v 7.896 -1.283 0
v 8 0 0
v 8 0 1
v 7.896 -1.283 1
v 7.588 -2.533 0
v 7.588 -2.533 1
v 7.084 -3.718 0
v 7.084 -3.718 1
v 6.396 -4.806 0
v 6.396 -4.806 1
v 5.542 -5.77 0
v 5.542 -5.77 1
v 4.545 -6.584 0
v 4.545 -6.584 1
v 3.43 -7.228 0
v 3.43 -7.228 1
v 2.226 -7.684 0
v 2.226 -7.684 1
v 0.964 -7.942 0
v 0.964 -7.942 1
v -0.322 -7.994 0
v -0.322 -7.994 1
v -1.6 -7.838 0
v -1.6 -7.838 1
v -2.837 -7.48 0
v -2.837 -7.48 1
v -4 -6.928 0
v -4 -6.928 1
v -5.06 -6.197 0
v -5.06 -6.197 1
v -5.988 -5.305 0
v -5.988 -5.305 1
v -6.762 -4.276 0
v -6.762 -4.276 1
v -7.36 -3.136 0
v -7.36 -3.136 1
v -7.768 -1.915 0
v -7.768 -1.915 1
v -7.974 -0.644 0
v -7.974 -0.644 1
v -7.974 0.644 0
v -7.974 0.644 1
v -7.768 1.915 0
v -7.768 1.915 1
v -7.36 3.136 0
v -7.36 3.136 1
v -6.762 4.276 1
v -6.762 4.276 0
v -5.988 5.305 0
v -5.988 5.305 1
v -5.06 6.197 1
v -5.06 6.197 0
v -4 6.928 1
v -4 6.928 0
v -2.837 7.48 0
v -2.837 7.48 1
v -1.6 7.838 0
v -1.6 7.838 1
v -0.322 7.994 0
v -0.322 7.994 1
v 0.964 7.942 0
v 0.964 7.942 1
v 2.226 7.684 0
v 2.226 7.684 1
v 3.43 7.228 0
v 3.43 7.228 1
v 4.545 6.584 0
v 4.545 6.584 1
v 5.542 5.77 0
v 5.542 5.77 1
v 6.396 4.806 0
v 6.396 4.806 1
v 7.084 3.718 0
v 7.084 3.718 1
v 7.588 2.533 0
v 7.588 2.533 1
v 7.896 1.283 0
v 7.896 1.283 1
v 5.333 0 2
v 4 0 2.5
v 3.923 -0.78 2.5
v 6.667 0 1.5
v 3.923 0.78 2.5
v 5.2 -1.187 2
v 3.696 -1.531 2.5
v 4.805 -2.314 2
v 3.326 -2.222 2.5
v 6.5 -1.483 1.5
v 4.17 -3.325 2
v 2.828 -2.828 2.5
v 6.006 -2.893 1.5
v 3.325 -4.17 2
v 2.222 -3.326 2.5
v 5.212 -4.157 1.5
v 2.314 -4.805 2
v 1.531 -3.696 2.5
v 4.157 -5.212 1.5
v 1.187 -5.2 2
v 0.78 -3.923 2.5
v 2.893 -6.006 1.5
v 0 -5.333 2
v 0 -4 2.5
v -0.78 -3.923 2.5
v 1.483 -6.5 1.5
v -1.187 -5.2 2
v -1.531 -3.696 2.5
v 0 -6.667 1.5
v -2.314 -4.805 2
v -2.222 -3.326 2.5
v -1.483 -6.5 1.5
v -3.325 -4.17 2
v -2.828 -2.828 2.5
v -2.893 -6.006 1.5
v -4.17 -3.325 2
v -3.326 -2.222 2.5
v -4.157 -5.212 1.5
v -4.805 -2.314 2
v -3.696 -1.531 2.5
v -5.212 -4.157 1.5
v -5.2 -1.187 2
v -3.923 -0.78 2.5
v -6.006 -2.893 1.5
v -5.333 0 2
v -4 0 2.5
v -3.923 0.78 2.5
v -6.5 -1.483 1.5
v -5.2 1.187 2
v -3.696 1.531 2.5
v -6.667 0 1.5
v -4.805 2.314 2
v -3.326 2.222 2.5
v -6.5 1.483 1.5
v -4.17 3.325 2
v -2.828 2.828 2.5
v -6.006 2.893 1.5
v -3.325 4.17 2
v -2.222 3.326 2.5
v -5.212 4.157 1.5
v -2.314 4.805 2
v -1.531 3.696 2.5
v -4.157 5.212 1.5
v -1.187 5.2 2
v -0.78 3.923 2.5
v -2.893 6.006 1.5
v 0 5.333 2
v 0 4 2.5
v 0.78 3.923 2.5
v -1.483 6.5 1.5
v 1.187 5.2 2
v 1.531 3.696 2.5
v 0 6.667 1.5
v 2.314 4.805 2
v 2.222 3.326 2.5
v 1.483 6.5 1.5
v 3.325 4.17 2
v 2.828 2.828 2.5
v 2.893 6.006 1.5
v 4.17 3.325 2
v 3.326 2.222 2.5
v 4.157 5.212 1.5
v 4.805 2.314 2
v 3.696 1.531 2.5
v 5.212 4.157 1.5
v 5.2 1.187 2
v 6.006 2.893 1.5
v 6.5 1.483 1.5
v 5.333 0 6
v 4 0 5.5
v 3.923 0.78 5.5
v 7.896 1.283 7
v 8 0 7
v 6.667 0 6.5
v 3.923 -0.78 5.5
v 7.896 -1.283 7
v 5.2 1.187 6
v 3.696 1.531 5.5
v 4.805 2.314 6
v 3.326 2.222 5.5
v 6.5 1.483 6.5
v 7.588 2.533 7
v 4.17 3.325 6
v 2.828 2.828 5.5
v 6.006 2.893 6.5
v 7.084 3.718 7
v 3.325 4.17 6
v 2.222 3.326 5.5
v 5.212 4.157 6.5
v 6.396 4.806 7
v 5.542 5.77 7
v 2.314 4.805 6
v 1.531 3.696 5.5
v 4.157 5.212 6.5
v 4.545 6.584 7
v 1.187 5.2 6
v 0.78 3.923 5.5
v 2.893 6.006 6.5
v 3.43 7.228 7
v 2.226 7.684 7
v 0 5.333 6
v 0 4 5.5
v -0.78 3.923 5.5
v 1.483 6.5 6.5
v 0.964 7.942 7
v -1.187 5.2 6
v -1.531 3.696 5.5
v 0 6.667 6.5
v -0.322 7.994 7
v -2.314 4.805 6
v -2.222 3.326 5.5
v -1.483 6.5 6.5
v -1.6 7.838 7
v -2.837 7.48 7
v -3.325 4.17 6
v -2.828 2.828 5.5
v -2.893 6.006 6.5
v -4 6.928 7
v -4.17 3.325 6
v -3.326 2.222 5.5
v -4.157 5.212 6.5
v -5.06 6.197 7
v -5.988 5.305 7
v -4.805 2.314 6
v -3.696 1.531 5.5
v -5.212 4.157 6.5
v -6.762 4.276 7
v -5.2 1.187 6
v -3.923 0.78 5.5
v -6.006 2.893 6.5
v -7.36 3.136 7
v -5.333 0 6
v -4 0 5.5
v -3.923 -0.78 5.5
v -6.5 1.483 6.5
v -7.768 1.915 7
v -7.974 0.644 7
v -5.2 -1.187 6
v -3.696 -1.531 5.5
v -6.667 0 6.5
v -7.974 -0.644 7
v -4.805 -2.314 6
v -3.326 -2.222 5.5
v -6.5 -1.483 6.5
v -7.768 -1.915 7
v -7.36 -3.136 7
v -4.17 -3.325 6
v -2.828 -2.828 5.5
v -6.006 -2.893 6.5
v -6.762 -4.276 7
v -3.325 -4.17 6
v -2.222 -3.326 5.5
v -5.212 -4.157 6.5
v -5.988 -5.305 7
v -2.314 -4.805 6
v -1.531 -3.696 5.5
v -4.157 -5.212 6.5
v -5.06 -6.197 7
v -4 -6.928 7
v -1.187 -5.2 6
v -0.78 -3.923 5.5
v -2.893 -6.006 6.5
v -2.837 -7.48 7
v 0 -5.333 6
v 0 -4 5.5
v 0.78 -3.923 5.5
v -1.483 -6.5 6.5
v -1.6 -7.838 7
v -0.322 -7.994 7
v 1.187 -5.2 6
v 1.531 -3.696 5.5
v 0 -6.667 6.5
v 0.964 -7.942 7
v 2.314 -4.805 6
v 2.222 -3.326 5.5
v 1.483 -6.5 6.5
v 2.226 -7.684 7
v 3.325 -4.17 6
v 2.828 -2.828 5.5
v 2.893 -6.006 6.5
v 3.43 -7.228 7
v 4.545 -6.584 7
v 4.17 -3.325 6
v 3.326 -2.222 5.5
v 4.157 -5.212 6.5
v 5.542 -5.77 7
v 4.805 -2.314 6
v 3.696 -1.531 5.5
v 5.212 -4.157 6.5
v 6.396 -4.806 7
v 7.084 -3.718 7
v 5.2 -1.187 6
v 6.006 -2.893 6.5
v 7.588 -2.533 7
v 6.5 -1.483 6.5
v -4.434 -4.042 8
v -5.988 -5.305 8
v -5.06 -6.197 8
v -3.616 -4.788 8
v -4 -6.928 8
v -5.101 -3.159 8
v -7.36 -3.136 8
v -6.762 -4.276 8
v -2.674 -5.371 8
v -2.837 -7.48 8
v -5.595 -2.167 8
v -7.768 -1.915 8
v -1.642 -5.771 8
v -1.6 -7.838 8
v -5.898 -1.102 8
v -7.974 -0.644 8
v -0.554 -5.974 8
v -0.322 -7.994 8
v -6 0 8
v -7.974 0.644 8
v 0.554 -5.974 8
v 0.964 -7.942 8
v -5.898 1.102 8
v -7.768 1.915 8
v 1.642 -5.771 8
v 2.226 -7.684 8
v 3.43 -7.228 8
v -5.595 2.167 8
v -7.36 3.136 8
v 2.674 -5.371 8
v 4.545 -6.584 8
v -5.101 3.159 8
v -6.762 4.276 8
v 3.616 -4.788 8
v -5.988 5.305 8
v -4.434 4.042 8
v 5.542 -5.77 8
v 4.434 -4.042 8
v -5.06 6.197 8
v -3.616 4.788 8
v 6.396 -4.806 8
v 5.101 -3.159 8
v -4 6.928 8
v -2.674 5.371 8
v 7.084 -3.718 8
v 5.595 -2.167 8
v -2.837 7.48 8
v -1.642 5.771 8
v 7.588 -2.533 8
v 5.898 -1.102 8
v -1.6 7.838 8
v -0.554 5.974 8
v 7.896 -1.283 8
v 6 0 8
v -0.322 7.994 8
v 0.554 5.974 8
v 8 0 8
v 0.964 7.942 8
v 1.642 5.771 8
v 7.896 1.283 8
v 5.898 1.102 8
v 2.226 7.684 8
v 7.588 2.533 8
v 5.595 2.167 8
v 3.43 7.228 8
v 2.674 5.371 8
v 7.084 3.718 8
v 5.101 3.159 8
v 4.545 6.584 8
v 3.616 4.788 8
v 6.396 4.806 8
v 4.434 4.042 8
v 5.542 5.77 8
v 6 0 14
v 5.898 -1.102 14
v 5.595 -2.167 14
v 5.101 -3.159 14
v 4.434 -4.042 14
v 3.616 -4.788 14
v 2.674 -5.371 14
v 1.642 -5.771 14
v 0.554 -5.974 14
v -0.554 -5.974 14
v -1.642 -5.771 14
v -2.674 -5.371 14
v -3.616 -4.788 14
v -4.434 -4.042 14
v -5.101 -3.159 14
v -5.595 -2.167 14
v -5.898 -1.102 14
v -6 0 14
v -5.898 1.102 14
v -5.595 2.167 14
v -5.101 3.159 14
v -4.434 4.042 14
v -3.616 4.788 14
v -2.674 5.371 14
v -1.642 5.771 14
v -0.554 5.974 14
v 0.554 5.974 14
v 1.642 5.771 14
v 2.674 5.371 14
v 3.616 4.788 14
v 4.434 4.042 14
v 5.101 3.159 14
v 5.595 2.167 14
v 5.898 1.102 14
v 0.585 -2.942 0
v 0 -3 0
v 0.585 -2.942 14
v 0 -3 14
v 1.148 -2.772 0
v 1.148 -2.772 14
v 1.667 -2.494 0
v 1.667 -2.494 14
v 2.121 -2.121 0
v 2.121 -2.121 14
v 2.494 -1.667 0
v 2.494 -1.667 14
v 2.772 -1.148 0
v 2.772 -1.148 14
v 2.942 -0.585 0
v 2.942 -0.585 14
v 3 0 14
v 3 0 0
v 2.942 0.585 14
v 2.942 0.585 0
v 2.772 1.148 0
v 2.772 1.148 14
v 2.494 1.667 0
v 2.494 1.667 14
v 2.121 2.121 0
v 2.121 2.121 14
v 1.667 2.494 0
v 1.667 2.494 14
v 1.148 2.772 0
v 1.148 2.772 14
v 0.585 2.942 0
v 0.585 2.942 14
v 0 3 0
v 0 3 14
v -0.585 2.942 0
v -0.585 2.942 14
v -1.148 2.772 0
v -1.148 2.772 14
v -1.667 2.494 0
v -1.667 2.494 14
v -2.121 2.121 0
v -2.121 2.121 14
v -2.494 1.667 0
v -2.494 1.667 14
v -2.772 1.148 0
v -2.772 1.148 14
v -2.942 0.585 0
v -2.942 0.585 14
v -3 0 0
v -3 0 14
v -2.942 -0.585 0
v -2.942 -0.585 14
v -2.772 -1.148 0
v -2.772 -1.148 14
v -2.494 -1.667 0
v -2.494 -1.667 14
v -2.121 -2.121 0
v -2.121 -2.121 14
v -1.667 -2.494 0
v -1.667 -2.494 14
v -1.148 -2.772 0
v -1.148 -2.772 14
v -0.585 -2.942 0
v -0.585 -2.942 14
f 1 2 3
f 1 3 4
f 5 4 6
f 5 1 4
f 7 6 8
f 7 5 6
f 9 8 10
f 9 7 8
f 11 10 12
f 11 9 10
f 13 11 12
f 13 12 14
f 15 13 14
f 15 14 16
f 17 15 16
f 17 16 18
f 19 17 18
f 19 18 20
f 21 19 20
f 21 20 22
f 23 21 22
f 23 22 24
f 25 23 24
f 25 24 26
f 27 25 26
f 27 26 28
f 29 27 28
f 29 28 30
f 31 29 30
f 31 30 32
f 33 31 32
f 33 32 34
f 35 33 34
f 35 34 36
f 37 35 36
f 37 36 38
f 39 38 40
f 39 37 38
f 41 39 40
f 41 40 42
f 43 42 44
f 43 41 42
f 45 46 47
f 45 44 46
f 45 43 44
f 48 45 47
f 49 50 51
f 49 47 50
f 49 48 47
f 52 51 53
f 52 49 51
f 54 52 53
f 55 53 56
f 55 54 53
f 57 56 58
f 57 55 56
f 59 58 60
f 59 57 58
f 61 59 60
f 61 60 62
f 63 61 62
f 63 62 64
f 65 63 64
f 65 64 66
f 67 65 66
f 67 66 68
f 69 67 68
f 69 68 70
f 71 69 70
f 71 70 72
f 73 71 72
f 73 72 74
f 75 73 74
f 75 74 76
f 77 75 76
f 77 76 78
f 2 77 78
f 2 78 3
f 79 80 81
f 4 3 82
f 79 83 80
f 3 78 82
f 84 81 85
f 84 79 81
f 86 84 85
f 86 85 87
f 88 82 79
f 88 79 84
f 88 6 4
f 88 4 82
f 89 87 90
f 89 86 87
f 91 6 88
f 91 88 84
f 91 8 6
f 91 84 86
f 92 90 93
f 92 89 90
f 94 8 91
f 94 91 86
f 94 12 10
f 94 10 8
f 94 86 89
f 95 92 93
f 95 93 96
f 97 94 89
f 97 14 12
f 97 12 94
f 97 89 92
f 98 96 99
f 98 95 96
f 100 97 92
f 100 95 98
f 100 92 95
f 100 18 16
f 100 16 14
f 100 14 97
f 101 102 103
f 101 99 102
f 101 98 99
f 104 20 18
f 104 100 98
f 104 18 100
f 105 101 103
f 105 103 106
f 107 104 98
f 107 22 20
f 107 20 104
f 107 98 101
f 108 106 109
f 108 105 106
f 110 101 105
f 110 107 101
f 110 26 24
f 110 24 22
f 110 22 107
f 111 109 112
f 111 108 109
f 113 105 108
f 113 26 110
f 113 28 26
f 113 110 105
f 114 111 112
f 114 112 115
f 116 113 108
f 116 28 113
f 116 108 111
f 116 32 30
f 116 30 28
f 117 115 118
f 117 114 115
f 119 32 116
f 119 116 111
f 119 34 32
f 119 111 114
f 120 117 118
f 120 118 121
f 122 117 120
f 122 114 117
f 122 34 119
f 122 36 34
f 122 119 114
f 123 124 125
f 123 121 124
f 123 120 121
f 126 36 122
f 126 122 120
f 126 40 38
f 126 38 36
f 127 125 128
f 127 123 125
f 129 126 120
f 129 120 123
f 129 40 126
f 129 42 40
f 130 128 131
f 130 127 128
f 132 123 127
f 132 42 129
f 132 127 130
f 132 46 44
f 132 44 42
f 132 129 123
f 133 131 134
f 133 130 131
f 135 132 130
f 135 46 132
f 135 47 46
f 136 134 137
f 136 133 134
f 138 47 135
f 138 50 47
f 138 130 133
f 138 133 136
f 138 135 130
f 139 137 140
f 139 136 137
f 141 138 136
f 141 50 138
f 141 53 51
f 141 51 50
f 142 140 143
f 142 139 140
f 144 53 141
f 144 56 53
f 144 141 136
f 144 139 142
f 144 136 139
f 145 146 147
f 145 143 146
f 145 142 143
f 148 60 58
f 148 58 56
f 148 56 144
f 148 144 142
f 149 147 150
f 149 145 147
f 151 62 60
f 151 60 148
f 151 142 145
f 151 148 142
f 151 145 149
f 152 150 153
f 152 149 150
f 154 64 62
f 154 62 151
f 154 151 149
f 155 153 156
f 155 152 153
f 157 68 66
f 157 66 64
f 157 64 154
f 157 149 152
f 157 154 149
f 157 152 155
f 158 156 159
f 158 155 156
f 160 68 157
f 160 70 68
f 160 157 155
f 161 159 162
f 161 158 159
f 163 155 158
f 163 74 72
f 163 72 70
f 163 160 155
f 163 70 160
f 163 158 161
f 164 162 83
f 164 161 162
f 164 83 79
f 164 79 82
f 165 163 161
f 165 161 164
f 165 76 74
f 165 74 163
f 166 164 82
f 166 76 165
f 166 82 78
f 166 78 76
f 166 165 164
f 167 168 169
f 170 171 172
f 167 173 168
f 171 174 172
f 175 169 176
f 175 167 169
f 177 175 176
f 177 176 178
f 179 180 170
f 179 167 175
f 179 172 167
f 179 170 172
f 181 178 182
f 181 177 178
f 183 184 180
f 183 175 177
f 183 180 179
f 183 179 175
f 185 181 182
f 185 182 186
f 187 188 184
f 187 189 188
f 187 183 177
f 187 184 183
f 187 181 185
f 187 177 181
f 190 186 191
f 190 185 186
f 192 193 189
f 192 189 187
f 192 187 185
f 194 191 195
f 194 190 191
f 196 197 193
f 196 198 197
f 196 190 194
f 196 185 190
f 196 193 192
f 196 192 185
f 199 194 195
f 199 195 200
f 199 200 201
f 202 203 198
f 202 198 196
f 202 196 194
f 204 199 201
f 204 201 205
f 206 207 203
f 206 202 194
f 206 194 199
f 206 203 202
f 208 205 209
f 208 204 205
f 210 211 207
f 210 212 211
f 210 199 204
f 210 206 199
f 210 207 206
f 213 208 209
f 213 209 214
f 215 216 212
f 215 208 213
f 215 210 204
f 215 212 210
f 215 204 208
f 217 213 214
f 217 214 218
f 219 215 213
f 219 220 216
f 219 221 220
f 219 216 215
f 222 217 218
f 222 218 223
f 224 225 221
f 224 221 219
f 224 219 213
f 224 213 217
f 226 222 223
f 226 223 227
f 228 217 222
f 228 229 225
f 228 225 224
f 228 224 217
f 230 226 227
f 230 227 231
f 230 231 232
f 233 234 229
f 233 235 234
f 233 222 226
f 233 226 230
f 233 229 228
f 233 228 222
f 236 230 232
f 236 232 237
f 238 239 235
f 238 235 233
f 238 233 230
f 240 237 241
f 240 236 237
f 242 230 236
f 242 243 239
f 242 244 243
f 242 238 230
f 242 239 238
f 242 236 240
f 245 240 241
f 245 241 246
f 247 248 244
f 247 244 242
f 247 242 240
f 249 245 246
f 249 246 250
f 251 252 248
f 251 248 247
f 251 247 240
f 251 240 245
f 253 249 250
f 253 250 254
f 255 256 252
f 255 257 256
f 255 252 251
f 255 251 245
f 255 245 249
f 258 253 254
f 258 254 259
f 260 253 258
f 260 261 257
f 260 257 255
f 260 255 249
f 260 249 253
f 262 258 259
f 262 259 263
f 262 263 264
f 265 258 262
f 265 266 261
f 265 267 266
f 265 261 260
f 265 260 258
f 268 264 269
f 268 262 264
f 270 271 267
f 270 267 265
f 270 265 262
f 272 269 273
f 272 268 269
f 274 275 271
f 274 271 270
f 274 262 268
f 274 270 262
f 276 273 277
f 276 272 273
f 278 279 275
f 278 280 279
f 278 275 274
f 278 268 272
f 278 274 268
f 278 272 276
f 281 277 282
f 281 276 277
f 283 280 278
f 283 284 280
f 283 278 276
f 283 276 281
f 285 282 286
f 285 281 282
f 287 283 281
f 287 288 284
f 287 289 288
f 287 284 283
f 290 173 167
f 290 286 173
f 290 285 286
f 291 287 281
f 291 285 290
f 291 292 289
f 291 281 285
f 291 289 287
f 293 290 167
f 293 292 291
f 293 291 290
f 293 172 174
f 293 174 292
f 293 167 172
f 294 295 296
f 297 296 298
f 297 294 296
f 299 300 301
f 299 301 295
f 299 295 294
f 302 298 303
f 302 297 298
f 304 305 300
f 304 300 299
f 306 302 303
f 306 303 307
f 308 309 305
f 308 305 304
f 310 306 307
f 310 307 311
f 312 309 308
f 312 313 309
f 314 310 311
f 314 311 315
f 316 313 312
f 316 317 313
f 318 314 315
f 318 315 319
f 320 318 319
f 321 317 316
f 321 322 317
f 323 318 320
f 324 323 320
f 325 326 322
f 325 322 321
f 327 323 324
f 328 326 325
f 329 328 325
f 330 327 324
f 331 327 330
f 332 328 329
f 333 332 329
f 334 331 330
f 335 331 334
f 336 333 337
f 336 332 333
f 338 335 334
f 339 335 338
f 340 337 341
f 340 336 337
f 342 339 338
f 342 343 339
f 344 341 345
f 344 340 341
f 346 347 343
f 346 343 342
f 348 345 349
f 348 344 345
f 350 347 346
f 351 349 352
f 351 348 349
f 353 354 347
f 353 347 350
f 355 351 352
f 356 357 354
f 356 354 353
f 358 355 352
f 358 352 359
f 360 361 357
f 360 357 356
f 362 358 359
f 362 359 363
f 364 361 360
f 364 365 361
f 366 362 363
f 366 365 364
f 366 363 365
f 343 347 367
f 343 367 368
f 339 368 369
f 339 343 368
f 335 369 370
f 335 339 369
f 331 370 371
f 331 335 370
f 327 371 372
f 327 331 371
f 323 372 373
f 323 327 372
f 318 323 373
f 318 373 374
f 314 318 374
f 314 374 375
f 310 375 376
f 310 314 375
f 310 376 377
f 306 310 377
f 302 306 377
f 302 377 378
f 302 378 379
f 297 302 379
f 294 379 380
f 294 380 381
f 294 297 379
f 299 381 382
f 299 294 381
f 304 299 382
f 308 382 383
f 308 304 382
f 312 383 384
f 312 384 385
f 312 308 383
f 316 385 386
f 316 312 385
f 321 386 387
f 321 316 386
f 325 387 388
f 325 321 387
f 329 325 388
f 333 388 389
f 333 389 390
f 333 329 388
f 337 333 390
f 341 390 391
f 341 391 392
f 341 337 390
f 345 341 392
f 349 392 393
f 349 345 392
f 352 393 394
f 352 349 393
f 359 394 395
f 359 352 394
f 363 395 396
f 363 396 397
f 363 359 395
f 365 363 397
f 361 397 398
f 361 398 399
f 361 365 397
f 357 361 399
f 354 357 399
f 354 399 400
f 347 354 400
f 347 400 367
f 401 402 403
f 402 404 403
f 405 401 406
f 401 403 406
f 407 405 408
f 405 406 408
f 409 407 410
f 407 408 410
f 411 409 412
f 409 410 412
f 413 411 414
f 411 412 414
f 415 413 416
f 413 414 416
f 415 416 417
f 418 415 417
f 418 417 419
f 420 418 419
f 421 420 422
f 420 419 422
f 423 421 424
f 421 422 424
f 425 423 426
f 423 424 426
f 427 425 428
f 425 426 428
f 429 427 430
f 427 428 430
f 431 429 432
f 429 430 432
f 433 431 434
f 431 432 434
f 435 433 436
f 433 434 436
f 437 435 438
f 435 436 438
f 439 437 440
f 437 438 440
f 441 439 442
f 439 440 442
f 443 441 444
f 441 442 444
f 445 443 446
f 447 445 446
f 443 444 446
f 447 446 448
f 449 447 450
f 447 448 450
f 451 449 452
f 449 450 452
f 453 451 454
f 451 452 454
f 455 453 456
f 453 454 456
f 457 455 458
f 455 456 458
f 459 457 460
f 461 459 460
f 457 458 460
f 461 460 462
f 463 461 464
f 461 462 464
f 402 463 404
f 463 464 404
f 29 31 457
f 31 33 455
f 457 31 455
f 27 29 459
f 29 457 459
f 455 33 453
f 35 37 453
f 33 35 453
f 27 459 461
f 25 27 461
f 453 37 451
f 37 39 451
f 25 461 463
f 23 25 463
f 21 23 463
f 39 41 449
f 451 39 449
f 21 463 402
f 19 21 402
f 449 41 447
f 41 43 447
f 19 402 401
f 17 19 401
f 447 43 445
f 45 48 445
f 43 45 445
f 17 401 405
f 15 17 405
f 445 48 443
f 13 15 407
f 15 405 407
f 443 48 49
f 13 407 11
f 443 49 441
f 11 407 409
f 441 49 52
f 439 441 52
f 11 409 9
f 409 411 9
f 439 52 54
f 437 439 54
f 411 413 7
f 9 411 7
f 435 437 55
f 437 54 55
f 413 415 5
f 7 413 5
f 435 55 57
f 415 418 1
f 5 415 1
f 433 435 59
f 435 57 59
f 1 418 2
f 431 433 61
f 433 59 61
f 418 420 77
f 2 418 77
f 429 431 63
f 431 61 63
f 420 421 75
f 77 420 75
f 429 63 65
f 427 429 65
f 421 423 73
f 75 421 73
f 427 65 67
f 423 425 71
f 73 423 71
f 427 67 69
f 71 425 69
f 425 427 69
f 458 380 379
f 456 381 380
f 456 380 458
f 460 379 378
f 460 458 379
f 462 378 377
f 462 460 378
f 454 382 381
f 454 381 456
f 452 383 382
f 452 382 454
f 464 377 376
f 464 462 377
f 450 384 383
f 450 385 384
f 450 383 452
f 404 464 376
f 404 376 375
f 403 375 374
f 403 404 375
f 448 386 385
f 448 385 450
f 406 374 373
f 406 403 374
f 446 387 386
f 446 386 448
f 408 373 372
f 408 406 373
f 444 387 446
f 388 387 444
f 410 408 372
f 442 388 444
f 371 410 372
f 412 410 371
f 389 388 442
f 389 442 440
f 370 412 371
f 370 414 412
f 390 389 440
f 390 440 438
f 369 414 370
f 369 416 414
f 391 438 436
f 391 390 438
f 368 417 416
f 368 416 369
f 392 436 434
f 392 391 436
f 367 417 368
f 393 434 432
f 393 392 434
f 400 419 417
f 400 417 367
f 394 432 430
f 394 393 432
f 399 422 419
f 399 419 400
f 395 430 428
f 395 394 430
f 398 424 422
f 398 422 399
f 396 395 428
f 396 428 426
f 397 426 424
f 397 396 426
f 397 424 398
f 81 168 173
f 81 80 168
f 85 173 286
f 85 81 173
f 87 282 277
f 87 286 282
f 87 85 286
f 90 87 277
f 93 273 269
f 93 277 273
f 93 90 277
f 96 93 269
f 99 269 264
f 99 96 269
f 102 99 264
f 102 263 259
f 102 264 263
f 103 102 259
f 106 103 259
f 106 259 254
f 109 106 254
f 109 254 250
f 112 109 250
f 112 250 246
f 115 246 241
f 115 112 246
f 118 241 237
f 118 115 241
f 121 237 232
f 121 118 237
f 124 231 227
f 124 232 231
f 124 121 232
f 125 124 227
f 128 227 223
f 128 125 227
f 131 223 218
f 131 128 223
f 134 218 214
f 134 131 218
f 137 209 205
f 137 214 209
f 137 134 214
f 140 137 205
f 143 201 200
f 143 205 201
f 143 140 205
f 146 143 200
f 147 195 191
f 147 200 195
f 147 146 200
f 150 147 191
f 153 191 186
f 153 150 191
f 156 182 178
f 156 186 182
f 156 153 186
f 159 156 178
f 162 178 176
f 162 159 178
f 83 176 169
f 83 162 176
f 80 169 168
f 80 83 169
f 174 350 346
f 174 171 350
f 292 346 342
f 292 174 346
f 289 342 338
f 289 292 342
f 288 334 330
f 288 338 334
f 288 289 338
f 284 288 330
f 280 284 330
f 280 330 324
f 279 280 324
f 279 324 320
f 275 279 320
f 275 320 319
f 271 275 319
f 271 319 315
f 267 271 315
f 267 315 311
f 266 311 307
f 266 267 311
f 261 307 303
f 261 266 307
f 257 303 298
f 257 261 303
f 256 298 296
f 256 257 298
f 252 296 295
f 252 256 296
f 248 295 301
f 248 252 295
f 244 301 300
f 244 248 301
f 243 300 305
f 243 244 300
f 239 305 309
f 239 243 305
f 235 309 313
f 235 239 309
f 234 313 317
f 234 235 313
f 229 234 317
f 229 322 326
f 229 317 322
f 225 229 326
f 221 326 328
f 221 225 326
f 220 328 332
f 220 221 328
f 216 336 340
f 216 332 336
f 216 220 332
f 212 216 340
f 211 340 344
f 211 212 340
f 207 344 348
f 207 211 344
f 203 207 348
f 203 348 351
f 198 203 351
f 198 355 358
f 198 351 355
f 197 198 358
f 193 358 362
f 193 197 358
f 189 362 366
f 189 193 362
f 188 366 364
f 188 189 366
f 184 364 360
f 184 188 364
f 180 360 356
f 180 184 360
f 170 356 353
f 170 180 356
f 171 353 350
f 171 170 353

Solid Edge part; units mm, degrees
sketch "Sketch1" plane through (0, 0, 0) normal (0, 0, 1) x (1, 0, 0)
  circle A0 centre (0, 0) radius 8
extrude "Protrusion1" add sketch "Sketch1" along normal blind 14
sketch "Sketch2" plane through (0, 0, 0) normal (0, -1, 0) x (1, 0, 0)
  line L0 (8, 14.2715) -> (6, 14.2715)
  line L1 (6, 14.2715) -> (6, 8)
  line L2 (6, 8) -> (8, 8)
  line L3 (8, 8) -> (8, 14.2715)
  line L4 (4, 5.5) -> (4, 2.5)
  line L5 (4, 2.5) -> (8, 1)
  line L6 (8, 7) -> (8, 1)
  line L7 (4, 5.5) -> (8, 7)
  dimension "D1" = 4
  dimension "D2" = 6
  dimension "D3" = 3
  dimension "D4" = 2.5
  dimension "D5" = 2.5
  dimension "D6" = 1
  dimension "D7" = 1
revolve "RevolvedCutout1" cut sketch "Sketch2" angle 360 about axis through (0, 0, 0) along (0, 0, 1)
hole "Hole_1" at (0, 0, 14) direction (0, 0, -1) diameter 6 end through all
